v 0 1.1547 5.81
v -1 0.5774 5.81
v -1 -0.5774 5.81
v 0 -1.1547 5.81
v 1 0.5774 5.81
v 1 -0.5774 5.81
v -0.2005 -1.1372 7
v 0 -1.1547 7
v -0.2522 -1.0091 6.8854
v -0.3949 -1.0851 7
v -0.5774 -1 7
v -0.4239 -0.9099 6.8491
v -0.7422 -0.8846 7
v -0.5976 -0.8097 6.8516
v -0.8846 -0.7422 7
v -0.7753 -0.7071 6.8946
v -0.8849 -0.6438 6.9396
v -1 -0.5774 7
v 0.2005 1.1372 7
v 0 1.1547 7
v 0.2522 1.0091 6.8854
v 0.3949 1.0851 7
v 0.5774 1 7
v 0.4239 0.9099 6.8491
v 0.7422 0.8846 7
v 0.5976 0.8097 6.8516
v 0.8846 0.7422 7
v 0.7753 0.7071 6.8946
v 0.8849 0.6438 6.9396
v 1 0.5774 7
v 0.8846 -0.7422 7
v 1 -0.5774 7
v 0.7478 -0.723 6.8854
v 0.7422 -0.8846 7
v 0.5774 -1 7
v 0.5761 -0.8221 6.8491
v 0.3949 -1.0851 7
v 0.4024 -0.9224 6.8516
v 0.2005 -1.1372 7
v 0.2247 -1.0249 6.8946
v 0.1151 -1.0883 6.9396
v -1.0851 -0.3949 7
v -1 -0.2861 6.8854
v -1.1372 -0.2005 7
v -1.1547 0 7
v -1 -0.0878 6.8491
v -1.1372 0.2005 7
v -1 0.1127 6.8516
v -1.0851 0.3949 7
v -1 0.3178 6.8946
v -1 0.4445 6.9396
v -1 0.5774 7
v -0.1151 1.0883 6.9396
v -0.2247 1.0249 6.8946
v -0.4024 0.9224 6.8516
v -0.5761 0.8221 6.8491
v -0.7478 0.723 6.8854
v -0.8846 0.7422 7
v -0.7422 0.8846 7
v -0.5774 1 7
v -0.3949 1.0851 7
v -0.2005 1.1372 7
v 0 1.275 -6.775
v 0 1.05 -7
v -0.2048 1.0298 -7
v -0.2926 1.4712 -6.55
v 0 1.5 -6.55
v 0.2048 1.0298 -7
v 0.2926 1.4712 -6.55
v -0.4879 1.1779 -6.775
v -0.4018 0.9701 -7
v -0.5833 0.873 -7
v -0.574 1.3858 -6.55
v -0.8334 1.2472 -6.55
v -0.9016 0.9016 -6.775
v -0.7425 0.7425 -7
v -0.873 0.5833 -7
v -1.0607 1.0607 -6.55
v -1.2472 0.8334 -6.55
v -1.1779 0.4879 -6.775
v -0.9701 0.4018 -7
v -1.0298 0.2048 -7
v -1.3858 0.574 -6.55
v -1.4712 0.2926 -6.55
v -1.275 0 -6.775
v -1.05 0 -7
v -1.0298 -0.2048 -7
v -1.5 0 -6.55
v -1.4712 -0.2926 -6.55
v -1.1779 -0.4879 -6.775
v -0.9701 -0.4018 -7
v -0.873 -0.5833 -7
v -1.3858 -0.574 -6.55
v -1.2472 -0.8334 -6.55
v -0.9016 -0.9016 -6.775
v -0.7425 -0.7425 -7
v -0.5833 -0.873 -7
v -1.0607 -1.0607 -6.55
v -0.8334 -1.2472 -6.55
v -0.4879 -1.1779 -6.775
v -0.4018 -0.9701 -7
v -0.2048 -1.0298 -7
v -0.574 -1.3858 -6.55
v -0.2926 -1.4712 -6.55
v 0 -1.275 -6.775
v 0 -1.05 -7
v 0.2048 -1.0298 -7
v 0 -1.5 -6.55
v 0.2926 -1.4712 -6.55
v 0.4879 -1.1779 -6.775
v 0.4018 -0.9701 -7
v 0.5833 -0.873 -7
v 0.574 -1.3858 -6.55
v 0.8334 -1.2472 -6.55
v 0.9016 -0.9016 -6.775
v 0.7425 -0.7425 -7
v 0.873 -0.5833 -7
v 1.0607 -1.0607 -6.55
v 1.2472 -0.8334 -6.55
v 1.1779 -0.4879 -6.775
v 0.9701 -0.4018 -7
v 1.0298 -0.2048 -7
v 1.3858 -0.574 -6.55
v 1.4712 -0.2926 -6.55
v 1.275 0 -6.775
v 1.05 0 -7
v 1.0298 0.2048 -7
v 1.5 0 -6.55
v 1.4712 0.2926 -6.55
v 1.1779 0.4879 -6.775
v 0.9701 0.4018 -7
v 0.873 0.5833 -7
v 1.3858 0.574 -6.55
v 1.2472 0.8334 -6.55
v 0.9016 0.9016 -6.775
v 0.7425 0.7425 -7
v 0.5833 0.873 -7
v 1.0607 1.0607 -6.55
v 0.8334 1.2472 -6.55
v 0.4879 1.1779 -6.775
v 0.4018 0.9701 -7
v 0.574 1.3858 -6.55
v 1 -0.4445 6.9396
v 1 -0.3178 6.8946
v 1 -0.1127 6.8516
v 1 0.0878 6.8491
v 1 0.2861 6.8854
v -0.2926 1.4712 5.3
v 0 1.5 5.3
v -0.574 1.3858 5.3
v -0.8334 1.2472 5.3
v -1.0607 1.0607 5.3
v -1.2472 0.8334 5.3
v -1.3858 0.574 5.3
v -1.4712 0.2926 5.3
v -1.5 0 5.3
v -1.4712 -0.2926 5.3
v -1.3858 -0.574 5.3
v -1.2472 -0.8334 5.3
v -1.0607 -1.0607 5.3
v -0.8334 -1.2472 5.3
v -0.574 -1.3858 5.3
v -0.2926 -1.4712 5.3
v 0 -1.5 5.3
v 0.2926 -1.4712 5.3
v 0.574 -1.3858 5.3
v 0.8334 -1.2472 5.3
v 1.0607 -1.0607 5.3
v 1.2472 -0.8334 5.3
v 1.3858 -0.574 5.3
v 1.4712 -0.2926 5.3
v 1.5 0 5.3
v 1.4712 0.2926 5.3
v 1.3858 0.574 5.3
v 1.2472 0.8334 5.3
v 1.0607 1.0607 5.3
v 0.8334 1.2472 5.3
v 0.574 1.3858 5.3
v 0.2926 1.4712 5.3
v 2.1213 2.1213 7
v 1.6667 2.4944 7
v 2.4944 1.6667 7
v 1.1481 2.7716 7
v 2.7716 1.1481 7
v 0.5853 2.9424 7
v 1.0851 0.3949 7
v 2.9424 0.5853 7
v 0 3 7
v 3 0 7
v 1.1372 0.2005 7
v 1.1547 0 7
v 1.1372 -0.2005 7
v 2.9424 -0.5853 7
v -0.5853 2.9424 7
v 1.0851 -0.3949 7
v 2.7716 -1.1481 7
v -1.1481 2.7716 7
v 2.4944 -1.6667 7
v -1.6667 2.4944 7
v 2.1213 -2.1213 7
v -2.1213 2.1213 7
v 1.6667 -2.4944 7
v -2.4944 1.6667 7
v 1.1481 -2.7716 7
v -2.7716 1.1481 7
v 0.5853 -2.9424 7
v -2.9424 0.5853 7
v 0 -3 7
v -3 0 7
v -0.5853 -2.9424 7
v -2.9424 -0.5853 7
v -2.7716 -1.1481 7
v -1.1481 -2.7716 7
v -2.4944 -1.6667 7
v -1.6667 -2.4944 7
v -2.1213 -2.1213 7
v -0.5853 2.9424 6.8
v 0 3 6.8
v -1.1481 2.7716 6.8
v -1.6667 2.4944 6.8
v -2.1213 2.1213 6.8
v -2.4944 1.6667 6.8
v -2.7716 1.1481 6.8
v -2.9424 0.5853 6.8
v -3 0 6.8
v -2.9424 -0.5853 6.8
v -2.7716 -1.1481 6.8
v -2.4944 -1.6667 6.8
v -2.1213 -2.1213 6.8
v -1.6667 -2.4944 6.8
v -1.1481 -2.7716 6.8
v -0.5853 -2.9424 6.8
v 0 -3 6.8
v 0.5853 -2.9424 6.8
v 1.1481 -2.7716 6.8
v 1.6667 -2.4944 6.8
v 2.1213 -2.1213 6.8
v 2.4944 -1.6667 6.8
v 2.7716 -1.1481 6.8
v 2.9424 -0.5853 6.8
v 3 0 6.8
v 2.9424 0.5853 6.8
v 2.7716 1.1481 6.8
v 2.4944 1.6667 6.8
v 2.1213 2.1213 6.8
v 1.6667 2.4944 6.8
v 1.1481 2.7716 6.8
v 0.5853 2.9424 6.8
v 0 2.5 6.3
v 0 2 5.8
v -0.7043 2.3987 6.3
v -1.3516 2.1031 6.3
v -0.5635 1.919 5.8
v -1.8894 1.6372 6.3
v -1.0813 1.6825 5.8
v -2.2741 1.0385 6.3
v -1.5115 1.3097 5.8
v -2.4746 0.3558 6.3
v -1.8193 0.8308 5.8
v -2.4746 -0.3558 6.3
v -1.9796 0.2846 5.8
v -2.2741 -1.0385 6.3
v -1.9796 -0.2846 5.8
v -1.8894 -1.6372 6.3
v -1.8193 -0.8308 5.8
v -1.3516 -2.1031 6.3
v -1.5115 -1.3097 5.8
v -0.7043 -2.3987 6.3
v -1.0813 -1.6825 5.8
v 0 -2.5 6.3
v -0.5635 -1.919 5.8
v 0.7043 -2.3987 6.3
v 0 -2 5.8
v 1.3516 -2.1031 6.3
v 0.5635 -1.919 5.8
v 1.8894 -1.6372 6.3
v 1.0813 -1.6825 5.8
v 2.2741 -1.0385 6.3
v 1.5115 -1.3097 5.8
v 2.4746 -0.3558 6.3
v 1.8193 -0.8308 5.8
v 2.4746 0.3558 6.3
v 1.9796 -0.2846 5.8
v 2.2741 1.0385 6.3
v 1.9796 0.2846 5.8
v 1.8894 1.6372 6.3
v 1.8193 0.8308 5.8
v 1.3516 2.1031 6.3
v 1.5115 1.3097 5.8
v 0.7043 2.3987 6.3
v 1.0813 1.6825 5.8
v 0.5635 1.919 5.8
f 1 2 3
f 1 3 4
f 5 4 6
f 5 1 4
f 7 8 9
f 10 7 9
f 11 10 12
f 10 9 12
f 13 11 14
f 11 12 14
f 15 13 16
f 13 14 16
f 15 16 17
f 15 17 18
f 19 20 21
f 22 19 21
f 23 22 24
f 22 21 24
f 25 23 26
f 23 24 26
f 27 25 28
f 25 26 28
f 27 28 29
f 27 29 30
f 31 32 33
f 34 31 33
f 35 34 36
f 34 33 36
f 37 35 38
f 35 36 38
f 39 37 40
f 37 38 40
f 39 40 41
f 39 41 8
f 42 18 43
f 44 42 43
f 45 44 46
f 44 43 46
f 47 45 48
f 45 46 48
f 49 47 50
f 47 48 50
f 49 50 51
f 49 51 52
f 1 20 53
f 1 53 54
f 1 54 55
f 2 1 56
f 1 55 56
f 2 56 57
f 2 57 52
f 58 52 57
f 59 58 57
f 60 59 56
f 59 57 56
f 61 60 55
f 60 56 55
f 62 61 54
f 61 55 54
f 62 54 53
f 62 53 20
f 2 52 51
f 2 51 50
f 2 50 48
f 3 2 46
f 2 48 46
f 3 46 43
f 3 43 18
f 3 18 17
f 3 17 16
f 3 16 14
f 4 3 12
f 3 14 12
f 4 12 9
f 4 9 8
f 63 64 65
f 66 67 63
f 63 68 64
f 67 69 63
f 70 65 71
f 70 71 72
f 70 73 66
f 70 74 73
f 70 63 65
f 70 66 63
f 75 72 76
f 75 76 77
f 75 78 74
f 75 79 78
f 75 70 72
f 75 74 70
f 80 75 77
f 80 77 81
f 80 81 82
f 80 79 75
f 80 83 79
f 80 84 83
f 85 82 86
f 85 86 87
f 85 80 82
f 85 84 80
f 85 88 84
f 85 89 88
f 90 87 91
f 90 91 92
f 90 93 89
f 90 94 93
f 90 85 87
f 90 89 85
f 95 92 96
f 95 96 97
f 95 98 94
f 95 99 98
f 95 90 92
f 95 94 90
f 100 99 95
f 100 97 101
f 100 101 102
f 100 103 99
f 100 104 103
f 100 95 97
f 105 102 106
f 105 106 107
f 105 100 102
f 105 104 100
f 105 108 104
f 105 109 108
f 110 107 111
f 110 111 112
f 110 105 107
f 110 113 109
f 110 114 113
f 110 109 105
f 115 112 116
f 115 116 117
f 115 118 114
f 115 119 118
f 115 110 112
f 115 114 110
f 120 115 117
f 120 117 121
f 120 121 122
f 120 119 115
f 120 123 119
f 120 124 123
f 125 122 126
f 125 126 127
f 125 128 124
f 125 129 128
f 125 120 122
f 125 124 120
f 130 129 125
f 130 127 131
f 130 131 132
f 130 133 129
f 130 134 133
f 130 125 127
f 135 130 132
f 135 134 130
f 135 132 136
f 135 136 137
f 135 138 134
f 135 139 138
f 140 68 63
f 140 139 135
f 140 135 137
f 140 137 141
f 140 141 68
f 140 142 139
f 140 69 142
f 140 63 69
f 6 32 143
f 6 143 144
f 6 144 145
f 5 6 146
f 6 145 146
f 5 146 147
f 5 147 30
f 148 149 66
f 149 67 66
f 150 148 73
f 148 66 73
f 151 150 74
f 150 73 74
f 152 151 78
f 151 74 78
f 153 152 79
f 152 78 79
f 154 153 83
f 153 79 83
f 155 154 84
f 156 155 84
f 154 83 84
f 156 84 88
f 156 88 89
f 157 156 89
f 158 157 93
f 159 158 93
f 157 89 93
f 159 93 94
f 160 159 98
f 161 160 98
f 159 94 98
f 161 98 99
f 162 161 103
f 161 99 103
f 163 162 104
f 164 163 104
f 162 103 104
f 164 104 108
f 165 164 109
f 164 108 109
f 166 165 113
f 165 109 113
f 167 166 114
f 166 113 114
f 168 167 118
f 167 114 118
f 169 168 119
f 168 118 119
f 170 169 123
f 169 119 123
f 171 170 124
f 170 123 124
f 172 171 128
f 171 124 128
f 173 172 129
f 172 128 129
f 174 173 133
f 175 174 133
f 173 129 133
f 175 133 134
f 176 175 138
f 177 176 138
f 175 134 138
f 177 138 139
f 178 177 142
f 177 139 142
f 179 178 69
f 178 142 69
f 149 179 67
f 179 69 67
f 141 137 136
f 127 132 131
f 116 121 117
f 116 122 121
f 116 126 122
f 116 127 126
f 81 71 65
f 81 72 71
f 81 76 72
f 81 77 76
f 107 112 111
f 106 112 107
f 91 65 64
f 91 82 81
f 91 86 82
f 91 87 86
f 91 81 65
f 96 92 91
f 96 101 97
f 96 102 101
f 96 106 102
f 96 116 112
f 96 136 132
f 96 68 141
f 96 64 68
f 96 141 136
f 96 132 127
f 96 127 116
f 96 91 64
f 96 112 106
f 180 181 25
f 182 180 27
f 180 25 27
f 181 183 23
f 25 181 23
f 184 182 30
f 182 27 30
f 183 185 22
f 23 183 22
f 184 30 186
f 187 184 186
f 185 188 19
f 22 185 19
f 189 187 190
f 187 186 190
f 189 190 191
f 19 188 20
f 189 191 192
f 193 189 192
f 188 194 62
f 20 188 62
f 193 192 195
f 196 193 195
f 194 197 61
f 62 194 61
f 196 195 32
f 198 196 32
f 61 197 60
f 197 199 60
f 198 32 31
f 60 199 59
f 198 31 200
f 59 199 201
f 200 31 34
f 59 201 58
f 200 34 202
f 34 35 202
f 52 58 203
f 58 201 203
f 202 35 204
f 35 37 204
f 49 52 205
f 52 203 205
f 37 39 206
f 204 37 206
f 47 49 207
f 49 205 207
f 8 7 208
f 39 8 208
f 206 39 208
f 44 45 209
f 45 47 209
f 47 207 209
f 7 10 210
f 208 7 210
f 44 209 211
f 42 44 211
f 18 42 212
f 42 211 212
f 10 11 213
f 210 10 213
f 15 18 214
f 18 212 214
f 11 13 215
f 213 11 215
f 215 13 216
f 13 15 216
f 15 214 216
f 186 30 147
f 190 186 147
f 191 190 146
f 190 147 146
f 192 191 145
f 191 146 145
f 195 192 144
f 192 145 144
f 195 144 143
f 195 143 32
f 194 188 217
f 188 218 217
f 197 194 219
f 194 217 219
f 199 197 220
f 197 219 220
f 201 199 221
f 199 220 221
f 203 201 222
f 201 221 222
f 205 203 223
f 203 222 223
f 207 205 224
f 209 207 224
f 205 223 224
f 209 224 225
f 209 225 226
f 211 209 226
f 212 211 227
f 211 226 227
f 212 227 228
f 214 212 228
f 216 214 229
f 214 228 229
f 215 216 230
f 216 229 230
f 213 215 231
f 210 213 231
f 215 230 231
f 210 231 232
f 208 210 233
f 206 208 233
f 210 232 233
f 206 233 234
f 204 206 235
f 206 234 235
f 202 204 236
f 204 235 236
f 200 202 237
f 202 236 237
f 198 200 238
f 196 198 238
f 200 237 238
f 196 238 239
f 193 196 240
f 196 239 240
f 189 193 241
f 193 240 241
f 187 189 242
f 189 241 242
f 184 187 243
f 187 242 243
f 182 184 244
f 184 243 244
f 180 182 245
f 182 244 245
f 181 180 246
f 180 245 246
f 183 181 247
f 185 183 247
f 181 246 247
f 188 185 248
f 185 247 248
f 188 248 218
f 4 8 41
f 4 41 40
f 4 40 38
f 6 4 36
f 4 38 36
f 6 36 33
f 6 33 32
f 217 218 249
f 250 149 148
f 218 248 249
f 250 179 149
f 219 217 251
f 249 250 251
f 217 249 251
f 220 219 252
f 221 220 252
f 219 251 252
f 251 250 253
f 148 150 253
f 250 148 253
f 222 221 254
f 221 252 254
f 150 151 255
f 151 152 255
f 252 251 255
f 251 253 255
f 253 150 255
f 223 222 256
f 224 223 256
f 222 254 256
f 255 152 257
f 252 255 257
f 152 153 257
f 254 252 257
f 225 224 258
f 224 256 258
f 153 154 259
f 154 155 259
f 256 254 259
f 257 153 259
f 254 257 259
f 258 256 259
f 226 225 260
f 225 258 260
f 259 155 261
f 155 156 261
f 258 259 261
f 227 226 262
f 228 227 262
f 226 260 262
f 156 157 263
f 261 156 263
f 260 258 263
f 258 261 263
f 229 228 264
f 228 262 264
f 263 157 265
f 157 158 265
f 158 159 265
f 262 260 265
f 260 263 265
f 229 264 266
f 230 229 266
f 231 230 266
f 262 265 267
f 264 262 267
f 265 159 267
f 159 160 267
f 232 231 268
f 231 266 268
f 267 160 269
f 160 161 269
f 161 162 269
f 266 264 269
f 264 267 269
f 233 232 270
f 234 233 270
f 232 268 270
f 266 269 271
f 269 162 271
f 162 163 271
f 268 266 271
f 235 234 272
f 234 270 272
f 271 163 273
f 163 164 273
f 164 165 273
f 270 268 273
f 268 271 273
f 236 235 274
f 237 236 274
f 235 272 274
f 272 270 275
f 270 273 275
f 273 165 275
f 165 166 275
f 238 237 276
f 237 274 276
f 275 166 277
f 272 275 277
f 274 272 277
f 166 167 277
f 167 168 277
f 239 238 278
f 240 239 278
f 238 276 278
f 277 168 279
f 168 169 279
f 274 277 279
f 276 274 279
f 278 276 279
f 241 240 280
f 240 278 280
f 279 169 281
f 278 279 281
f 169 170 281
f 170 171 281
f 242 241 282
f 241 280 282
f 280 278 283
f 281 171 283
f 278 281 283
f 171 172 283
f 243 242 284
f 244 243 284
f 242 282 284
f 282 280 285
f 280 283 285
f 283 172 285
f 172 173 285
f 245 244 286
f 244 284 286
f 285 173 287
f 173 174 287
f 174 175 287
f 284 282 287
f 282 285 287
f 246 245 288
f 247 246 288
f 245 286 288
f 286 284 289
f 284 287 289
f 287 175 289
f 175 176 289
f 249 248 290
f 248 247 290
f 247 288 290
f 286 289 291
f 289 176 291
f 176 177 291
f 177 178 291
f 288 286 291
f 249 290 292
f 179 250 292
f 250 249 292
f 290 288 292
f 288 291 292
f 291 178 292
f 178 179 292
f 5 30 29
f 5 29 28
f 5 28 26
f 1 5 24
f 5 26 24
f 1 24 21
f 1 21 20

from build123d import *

# Parameters (mm, degrees)
SKETCH3_W          = 14
SKETCH3_H          = 1.5
CHAMFER1_SIZE      = 0.45
CUT_EXTRUDE1_DEPTH = 1.19


with BuildPart() as part:
    # Sketch3 → Revolve1 (revolve)
    with BuildSketch(Plane(origin=(0, 0, 0), x_dir=(0, 0, -1), z_dir=(1, 0, 0))):
        with Locations((0, 0.75)):
            Rectangle(SKETCH3_W, SKETCH3_H)
    revolve(axis=Axis((0, 0, -7), (0, 0, 1)))

    # Chamfer1
    chamfer1_edges = [part.edges().sort_by_distance(p)[0] for p in [
        (0, -1.5, -7),
    ]]
    chamfer(chamfer1_edges, length=CHAMFER1_SIZE)

    # Sketch6 → Revolve2 (revolve)
    with BuildSketch(Plane(origin=(0, 0, 0), x_dir=(0, 0, -1), z_dir=(1, 0, 0))):
        Polygon((-7, 3), (-6.8, 3), (-5.3, 1.5), (-5.3, 0), (-7, 0), align=None)
    revolve(axis=Axis((0, 0, -7), (0, 0, 1)))

    # Sketch8 → Cut-Extrude1 (cut)
    with BuildSketch(Plane.XY.offset(7)):
        Polygon((0, 1.154700538), (-1, 0.577350269), (-1, -0.577350269), (0, -1.154700538), (1, -0.577350269), (1, 0.577350269), align=None)
    extrude(amount=-CUT_EXTRUDE1_DEPTH, mode=Mode.SUBTRACT)

    # Cut-Extrude2 cone 1 section (through the dimple's axis) → Cut-Extrude2 (revolve, cut)
    with BuildSketch(Plane(origin=(0, 0, 7), x_dir=(0, -1, 0), z_dir=(1, 0, 0))):
        Polygon((0, 0), (1.154700538, 0), (0, 1.154700538), align=None)
    revolve(axis=Axis((0, 0, 7), (0, 0, -1)), mode=Mode.SUBTRACT)


solid = part.part
